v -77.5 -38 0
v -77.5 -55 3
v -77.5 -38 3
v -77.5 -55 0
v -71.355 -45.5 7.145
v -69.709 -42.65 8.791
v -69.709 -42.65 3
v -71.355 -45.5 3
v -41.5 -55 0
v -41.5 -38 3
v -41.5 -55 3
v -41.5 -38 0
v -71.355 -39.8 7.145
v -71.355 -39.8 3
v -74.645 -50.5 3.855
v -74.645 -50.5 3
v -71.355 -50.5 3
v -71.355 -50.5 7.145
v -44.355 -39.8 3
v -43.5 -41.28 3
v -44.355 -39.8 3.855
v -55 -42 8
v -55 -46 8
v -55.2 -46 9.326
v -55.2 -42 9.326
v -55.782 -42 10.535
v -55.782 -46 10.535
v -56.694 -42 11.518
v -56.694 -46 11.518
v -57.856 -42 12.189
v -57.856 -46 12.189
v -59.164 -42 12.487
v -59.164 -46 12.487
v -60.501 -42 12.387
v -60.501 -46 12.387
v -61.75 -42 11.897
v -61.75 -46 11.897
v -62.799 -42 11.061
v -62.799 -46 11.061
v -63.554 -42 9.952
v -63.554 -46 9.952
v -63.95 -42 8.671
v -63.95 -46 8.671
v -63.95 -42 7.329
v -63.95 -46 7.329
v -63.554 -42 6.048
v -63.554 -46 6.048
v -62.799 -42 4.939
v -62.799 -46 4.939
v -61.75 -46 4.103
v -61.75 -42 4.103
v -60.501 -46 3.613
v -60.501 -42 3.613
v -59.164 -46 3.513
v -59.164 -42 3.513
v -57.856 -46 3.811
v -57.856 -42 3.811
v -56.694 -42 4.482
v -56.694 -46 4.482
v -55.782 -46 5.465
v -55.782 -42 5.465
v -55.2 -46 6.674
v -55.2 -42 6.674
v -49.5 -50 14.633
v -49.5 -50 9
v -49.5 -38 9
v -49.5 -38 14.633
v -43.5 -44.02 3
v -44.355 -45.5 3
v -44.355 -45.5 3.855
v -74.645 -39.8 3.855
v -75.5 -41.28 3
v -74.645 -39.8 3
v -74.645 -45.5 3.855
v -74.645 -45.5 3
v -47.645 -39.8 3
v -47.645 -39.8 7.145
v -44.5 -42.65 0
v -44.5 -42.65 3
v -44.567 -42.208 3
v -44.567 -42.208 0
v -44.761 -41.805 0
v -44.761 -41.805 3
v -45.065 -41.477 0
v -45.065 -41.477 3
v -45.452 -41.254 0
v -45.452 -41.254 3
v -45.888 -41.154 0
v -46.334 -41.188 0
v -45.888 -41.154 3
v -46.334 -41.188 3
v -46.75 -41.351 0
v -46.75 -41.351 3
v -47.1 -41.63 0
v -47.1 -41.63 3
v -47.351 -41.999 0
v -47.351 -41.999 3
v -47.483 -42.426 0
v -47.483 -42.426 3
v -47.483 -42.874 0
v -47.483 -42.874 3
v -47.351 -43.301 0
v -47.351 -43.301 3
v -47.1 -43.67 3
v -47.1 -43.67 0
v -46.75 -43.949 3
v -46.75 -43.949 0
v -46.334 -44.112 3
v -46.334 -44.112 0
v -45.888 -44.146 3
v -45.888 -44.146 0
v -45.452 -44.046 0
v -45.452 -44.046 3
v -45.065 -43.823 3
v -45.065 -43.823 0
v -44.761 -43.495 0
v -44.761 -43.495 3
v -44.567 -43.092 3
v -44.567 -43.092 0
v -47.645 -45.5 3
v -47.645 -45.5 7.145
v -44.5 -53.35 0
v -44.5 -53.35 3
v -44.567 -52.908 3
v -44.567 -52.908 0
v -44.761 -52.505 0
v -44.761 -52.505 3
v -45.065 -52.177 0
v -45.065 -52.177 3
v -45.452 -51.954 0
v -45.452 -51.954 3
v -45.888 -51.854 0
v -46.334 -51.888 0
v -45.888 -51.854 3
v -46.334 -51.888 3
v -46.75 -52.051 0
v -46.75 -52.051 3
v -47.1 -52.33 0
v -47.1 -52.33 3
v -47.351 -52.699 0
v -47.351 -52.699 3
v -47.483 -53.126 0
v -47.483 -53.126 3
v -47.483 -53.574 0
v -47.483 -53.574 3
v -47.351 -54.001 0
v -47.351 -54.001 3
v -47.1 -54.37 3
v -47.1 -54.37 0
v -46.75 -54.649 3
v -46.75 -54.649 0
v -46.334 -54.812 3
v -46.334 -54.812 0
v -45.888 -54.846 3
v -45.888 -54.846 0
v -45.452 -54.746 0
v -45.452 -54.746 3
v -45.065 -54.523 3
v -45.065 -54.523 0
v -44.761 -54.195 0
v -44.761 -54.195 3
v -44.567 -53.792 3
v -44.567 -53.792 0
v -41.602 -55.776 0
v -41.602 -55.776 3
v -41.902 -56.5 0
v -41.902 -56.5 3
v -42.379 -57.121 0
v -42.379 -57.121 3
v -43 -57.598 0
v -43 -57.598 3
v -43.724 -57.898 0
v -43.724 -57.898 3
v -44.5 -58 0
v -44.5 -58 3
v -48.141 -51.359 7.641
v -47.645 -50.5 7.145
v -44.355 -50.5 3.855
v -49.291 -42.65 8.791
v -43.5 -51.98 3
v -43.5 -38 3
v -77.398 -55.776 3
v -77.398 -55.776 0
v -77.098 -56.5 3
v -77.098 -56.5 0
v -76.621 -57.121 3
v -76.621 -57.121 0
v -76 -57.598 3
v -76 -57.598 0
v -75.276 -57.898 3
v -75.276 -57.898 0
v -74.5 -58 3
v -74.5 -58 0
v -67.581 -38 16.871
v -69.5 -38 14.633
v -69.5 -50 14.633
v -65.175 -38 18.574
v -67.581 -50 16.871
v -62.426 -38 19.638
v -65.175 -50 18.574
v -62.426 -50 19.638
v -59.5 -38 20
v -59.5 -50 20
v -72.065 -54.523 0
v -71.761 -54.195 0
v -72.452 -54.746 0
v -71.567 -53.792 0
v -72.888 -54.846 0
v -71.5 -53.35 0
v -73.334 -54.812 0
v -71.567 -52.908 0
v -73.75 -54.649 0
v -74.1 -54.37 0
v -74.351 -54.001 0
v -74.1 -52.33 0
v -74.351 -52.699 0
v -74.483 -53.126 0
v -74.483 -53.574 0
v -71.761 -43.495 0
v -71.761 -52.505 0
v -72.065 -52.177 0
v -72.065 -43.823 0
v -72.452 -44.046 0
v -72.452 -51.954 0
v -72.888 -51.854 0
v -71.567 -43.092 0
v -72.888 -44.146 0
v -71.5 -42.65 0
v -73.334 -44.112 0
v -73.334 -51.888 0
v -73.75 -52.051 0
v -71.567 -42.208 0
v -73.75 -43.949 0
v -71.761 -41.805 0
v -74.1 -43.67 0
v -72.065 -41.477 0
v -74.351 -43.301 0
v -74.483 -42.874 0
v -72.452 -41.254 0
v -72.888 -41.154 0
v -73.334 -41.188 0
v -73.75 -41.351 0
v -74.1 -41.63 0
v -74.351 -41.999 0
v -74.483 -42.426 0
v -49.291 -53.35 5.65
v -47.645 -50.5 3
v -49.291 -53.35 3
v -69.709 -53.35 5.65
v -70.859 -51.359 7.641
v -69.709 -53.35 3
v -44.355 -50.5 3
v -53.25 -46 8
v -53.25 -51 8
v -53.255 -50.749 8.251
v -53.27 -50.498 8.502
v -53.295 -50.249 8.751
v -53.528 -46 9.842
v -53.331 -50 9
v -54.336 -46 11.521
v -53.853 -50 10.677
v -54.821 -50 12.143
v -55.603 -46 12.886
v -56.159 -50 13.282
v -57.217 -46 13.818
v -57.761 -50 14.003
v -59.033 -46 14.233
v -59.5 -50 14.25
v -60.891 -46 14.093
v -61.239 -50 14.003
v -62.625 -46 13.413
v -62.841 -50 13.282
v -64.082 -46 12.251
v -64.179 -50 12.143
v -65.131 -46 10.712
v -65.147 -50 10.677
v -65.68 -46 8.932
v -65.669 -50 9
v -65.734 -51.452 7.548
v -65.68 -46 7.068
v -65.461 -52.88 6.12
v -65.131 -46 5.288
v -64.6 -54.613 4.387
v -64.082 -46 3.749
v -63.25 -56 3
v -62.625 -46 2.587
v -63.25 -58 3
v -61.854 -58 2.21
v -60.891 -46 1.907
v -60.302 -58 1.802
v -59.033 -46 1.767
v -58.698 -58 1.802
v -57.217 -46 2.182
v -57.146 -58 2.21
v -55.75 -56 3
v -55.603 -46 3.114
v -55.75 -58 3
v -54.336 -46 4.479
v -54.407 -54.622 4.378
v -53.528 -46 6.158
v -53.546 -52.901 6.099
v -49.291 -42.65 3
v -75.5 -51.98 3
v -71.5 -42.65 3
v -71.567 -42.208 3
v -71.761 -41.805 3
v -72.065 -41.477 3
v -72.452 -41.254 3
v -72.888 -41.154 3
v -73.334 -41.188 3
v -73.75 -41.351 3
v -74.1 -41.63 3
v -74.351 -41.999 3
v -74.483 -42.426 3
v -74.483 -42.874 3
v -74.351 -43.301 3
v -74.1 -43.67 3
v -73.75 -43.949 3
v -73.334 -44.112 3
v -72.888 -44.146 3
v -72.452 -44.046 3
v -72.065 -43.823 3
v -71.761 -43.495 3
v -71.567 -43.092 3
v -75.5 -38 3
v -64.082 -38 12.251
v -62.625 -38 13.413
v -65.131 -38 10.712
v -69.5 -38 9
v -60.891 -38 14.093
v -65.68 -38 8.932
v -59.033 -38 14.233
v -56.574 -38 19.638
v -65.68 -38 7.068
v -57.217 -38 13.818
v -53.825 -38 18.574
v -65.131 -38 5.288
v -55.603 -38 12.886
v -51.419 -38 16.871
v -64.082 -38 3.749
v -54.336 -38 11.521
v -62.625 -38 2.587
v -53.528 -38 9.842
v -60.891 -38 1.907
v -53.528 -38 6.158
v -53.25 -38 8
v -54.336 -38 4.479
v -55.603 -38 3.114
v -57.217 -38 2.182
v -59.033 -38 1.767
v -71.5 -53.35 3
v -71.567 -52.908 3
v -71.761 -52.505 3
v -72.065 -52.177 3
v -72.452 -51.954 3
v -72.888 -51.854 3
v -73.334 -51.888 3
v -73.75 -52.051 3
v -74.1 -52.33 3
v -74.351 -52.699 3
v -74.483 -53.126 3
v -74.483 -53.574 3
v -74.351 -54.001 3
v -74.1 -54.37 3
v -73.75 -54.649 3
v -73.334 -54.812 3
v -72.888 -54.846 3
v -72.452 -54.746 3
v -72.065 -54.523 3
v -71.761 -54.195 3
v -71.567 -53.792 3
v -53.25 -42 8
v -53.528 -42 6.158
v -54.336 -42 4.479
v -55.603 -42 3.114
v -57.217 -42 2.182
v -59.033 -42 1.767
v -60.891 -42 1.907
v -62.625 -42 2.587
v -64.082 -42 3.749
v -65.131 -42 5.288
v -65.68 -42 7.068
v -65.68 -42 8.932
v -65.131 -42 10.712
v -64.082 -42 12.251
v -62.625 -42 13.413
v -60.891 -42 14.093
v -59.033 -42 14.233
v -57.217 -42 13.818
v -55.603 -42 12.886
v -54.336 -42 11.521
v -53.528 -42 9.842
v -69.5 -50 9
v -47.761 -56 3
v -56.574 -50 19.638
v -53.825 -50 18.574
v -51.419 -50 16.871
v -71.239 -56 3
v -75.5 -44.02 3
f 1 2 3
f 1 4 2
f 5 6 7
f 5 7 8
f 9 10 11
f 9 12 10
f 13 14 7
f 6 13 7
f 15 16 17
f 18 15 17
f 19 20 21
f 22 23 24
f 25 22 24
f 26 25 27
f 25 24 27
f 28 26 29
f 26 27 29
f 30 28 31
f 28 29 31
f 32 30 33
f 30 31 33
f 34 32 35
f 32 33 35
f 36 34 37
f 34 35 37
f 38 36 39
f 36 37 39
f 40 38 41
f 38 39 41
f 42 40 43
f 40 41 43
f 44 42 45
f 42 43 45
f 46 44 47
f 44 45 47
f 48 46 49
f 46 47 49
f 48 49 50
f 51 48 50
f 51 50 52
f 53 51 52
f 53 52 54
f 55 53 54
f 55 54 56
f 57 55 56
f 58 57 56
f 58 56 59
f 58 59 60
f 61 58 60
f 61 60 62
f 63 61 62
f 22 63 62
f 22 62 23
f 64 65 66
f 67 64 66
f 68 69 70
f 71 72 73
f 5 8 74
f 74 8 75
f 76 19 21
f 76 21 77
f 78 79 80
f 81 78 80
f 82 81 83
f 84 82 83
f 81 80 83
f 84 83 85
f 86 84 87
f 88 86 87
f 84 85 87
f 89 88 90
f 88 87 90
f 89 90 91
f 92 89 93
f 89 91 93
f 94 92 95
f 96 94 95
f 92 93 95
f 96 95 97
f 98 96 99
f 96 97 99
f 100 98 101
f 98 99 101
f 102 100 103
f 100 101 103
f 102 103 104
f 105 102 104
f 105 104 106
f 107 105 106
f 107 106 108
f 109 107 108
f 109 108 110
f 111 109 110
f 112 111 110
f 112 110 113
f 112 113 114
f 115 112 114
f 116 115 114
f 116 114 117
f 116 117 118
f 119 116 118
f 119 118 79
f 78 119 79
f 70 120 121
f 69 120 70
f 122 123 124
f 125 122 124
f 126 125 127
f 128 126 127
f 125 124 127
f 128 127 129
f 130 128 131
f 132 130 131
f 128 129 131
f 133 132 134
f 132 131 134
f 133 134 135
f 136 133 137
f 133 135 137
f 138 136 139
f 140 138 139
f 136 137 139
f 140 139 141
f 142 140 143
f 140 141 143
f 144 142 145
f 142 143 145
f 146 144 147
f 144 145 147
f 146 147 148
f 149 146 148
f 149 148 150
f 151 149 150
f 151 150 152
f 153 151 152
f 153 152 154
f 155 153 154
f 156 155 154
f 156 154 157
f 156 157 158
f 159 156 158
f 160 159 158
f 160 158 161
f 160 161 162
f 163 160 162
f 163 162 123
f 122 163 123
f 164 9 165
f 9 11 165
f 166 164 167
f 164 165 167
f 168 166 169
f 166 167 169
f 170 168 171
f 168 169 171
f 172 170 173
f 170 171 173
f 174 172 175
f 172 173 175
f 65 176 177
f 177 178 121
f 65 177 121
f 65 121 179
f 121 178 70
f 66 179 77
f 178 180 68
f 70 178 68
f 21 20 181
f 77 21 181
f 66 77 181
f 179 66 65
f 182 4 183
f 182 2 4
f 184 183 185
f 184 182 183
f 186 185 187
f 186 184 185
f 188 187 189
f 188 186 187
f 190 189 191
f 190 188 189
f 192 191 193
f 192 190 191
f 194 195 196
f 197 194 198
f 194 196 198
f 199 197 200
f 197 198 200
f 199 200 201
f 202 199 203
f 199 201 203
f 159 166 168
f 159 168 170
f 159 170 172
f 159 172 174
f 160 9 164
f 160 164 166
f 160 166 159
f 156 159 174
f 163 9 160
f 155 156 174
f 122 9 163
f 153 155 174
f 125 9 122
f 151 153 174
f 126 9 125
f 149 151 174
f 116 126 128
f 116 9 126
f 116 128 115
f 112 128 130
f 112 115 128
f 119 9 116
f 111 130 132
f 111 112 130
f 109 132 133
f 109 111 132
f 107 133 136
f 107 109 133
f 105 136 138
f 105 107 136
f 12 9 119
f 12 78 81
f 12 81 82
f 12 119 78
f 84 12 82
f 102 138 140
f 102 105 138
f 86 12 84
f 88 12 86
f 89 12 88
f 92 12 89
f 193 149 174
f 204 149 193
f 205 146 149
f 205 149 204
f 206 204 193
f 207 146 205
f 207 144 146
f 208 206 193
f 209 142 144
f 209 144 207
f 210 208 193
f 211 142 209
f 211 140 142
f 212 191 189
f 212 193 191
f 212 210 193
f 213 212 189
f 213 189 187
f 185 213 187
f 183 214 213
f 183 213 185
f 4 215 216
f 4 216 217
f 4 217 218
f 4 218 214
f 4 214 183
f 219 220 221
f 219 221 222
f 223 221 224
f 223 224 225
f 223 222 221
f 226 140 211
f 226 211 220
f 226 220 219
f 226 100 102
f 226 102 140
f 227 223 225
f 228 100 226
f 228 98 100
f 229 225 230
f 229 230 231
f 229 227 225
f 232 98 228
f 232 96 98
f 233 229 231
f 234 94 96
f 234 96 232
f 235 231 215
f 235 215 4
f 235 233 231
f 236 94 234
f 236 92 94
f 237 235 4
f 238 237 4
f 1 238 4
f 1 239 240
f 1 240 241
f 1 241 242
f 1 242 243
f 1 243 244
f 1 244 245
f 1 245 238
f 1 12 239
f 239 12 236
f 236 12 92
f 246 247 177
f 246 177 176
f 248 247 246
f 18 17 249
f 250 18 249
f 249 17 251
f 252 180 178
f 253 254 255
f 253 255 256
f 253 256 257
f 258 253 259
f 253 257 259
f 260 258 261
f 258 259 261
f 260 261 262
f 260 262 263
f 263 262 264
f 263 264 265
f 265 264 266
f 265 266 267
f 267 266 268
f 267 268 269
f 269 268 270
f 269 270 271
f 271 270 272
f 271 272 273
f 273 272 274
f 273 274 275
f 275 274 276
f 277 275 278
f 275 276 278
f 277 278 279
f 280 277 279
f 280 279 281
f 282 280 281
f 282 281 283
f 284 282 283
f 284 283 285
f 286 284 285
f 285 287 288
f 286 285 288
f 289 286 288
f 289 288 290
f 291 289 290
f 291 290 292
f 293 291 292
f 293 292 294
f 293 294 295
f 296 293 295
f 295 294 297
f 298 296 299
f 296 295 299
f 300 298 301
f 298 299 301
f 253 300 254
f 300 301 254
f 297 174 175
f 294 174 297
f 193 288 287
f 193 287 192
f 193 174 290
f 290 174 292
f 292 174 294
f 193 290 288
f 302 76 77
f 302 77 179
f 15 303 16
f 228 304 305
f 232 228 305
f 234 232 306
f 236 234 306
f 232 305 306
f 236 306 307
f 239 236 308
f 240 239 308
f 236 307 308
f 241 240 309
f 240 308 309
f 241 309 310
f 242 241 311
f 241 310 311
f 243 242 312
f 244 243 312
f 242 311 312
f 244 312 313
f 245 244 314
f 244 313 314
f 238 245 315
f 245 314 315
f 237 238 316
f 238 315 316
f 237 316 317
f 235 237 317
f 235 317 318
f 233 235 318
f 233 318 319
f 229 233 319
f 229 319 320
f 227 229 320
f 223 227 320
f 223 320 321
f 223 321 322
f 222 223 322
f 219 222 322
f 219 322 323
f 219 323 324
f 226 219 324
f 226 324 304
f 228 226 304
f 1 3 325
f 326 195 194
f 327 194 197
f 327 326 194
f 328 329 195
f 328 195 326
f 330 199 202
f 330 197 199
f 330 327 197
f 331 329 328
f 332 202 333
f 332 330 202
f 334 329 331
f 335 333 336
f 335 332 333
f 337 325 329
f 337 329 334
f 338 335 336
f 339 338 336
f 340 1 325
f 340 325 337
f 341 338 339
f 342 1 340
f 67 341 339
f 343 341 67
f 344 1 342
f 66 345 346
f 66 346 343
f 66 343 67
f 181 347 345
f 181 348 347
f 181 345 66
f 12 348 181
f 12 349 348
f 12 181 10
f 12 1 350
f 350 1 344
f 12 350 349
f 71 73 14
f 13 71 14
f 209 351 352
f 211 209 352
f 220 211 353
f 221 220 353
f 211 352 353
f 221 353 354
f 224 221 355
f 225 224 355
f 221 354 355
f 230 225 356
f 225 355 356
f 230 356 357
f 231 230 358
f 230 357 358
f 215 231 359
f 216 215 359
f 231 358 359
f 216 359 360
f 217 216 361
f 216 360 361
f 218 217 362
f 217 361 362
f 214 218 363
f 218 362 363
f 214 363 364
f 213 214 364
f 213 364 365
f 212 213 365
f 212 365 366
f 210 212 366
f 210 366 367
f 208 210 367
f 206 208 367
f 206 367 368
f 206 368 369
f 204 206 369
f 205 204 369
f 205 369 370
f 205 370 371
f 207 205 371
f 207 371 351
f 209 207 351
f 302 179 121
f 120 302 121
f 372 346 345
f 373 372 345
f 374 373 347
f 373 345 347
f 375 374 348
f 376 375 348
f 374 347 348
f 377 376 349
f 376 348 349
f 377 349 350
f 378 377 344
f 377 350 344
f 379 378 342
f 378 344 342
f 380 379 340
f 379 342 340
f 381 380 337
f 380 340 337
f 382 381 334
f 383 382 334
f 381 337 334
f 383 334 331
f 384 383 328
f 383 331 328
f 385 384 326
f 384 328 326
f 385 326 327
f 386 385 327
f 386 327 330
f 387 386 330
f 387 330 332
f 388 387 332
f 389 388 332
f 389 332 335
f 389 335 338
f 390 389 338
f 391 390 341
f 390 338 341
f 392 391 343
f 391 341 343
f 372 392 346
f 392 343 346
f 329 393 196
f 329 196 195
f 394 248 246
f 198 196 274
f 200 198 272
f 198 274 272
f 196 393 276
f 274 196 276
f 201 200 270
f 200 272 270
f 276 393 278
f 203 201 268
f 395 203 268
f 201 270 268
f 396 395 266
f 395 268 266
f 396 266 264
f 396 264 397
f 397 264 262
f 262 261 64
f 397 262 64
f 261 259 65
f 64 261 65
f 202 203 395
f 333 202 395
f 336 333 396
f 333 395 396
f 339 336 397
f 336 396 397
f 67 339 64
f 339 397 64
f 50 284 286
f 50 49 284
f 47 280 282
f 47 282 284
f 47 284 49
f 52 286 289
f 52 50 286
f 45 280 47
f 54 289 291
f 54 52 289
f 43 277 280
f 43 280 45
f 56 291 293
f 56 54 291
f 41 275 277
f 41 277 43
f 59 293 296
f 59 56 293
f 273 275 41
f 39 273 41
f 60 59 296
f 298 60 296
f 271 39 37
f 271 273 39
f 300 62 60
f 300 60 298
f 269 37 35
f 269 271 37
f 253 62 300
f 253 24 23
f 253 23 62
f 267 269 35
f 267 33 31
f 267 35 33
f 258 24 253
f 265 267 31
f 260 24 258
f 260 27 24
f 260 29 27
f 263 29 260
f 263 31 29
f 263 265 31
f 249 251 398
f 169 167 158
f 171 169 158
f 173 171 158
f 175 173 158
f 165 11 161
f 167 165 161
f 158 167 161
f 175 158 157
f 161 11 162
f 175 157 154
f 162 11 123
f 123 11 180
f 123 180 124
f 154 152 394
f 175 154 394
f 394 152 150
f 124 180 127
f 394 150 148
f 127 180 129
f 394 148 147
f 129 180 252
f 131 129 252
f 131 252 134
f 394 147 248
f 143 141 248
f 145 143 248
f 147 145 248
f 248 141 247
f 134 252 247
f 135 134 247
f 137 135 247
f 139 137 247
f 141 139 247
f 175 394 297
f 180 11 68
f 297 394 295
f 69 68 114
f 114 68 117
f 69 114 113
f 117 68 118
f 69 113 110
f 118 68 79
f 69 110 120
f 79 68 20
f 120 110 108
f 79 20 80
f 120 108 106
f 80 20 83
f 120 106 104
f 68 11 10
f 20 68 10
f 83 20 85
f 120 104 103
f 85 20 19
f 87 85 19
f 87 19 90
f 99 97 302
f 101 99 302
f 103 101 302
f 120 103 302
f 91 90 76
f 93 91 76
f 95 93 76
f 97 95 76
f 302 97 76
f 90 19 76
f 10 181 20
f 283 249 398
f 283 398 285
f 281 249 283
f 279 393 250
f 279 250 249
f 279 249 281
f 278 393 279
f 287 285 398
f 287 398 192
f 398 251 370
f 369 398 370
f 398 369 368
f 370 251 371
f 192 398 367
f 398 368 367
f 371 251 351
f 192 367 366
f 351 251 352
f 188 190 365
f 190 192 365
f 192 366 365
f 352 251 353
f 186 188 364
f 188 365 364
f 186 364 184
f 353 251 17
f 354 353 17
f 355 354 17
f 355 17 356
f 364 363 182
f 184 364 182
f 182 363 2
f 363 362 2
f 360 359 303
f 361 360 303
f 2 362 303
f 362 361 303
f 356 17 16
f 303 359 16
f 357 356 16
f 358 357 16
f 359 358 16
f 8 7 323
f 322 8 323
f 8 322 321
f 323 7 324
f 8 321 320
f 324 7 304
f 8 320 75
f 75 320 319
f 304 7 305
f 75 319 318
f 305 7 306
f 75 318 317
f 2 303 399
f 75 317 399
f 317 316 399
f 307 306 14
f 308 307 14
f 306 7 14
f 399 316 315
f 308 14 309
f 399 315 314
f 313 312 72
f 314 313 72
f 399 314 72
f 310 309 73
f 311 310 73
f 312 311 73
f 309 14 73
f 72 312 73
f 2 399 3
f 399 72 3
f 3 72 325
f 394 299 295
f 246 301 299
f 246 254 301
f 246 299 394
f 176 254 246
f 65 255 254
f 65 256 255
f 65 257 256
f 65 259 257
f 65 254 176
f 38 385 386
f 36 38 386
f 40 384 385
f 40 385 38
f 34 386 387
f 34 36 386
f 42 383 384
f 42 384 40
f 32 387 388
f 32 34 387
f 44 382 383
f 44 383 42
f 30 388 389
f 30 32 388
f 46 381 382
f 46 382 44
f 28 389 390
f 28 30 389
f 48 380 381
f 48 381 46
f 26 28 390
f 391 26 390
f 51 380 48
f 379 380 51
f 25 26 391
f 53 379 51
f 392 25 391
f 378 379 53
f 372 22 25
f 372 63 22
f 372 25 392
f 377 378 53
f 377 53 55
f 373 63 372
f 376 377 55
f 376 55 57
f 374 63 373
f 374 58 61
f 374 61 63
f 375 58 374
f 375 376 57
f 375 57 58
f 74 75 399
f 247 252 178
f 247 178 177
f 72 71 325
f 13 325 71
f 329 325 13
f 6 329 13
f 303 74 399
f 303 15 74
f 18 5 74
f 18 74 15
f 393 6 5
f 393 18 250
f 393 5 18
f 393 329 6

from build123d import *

# Parameters (mm, degrees)
SKETCH1_W           = 20
SKETCH1_H           = 12
BOSS_EXTRUDE1_DEPTH = 20
SKETCH2_R           = 3
CUT_EXTRUDE1_DEPTH  = 13
SKETCH3_R           = 6.25
CUT_EXTRUDE2_DEPTH  = 4
SKETCH4_R           = 4.5
CUT_EXTRUDE3_DEPTH  = 9
SKETCH5_R           = 6.25
CUT_EXTRUDE4_DEPTH  = 4
BOSS_EXTRUDE2_DEPTH = 3
SKETCH7_R           = 6.25
CUT_EXTRUDE5_DEPTH  = 12
CHAMFER1_SIZE       = 6
CUT_EXTRUDE6_DEPTH  = 14
SKETCH9_W           = 3.789335489
SKETCH9_H           = 4.098961347
CUT_EXTRUDE7_DEPTH  = 2
SKETCH10_R          = 1.5
CUT_EXTRUDE8_DEPTH  = 4
CUT_EXTRUDE9_DEPTH  = 13
FILLET1_R           = 3


with BuildPart() as part:
    # Sketch1 → Boss-Extrude1 (new body)
    with BuildSketch(Plane.XY):
        with Locations((-59.5, -44)):
            Rectangle(SKETCH1_W, SKETCH1_H)
    extrude(amount=BOSS_EXTRUDE1_DEPTH)

    # Sketch2 → Cut-Extrude1 (cut, through all)
    with BuildSketch(Plane.XZ.offset(50)):
        with Locations((-59.5, 8)):
            Circle(SKETCH2_R)
    extrude(amount=-CUT_EXTRUDE1_DEPTH, mode=Mode.SUBTRACT)

    # Sketch3 → Cut-Extrude2 (cut)
    with BuildSketch(Plane.XZ.offset(50)):
        with Locations((-59.5, 8)):
            Circle(SKETCH3_R)
    extrude(amount=-CUT_EXTRUDE2_DEPTH, mode=Mode.SUBTRACT)

    # Sketch4 → Cut-Extrude3 (cut, through all)
    with BuildSketch(Plane.XZ.offset(46)):
        with Locations((-59.5, 8)):
            Circle(SKETCH4_R)
    extrude(amount=-CUT_EXTRUDE3_DEPTH, mode=Mode.SUBTRACT)

    # Sketch5 → Cut-Extrude4 (cut)
    with BuildSketch(Plane(origin=(0, -38, 0), x_dir=(1, 0, 0), z_dir=(0, 1, 0))):
        with Locations((-59.5, -8)):
            Circle(SKETCH5_R)
    extrude(amount=-CUT_EXTRUDE4_DEPTH, mode=Mode.SUBTRACT)

    # Sketch6 → Boss-Extrude2 (add)
    with BuildSketch(Plane(origin=(0, 0, 0), x_dir=(-1, 0, 0), z_dir=(0, 0, -1))):
        Polygon((49.5, -38), (41.5, -38), (41.5, -58), (77.5, -58), (77.5, -38), (69.5, -38), (69.5, -50), (49.5, -50), align=None)
    extrude(amount=-BOSS_EXTRUDE2_DEPTH)

    # Sketch7 → Cut-Extrude5 (cut)
    with BuildSketch(Plane.XZ.offset(58)):
        with Locations((-59.5, 8)):
            Circle(SKETCH7_R)
    extrude(amount=-CUT_EXTRUDE5_DEPTH, mode=Mode.SUBTRACT)

    # Chamfer1
    chamfer1_edges = [part.edges().sort_by_distance(p)[0] for p in [
        (-49.5, -44, 3),
        (-66.375, -50, 3),
        (-52.625, -50, 3),
        (-69.5, -44, 3),
    ]]
    chamfer(chamfer1_edges, length=CHAMFER1_SIZE)

    # Sketch8 → Cut-Extrude6 (cut)
    with BuildSketch(Plane.XY.offset(3)):
        Polygon((-47.645448267, -39.8), (-49.290896534, -42.65), (-47.645448267, -45.5), (-44.354551733, -45.5), (-42.709103466, -42.65), (-44.354551733, -39.8), align=None)
        Polygon((-47.645448267, -50.5), (-49.290896534, -53.35), (-47.645448267, -56.2), (-44.354551733, -56.2), (-42.709103466, -53.35), (-44.354551733, -50.5), align=None)
        Polygon((-74.645448267, -50.5), (-71.354551733, -50.5), (-69.709103466, -53.35), (-71.354551733, -56.2), (-74.645448267, -56.2), (-76.290896534, -53.35), align=None)
        Polygon((-74.645448267, -39.8), (-71.354551733, -39.8), (-69.709103466, -42.65), (-71.354551733, -45.5), (-74.645448267, -45.5), (-76.290896534, -42.65), align=None)
    extrude(amount=CUT_EXTRUDE6_DEPTH, mode=Mode.SUBTRACT)

    # Sketch9 → Cut-Extrude7 (cut)
    with BuildSketch(Plane.XY.offset(3)):
        with Locations((-43.394667744, -55.950519327)):
            Rectangle(SKETCH9_W, SKETCH9_H)
        with Locations((-75.605332256, -55.950519327)):
            Rectangle(SKETCH9_W, SKETCH9_H)
    extrude(amount=CUT_EXTRUDE7_DEPTH, mode=Mode.SUBTRACT)

    # Sketch10 → Cut-Extrude8 (cut, through all)
    with BuildSketch(Plane.XY.offset(3)):
        with Locations((-73, -42.65)):
            Circle(SKETCH10_R)
        with Locations((-73, -53.35)):
            Circle(SKETCH10_R)
        with Locations((-46, -53.35)):
            Circle(SKETCH10_R)
        with Locations((-46, -42.65)):
            Circle(SKETCH10_R)
    extrude(amount=-CUT_EXTRUDE8_DEPTH, mode=Mode.SUBTRACT)

    # Sketch11 → Cut-Extrude9 (cut, through all)
    with BuildSketch(Plane.XZ.offset(50)):
        with BuildLine():
            Line((-69.5, 20), (-69.5, 14.633249581))
            ThreePointArc((-69.5, 14.633249581), (-65.174548662, 18.573528147), (-59.5, 20))
            Line((-59.5, 20), (-69.5, 20))
        make_face()
        with BuildLine():
            ThreePointArc((-59.5, 20), (-53.825451338, 18.573528147), (-49.5, 14.633249581))
            Line((-49.5, 14.633249581), (-49.5, 20))
            Line((-49.5, 20), (-59.5, 20))
        make_face()
    extrude(amount=-CUT_EXTRUDE9_DEPTH, mode=Mode.SUBTRACT)

    # Fillet1
    fillet1_edges = [part.edges().sort_by_distance(p)[0] for p in [
        (-77.5, -58, 1.5),
        (-41.5, -58, 1.5),
    ]]
    fillet(fillet1_edges, radius=FILLET1_R)


solid = part.part
